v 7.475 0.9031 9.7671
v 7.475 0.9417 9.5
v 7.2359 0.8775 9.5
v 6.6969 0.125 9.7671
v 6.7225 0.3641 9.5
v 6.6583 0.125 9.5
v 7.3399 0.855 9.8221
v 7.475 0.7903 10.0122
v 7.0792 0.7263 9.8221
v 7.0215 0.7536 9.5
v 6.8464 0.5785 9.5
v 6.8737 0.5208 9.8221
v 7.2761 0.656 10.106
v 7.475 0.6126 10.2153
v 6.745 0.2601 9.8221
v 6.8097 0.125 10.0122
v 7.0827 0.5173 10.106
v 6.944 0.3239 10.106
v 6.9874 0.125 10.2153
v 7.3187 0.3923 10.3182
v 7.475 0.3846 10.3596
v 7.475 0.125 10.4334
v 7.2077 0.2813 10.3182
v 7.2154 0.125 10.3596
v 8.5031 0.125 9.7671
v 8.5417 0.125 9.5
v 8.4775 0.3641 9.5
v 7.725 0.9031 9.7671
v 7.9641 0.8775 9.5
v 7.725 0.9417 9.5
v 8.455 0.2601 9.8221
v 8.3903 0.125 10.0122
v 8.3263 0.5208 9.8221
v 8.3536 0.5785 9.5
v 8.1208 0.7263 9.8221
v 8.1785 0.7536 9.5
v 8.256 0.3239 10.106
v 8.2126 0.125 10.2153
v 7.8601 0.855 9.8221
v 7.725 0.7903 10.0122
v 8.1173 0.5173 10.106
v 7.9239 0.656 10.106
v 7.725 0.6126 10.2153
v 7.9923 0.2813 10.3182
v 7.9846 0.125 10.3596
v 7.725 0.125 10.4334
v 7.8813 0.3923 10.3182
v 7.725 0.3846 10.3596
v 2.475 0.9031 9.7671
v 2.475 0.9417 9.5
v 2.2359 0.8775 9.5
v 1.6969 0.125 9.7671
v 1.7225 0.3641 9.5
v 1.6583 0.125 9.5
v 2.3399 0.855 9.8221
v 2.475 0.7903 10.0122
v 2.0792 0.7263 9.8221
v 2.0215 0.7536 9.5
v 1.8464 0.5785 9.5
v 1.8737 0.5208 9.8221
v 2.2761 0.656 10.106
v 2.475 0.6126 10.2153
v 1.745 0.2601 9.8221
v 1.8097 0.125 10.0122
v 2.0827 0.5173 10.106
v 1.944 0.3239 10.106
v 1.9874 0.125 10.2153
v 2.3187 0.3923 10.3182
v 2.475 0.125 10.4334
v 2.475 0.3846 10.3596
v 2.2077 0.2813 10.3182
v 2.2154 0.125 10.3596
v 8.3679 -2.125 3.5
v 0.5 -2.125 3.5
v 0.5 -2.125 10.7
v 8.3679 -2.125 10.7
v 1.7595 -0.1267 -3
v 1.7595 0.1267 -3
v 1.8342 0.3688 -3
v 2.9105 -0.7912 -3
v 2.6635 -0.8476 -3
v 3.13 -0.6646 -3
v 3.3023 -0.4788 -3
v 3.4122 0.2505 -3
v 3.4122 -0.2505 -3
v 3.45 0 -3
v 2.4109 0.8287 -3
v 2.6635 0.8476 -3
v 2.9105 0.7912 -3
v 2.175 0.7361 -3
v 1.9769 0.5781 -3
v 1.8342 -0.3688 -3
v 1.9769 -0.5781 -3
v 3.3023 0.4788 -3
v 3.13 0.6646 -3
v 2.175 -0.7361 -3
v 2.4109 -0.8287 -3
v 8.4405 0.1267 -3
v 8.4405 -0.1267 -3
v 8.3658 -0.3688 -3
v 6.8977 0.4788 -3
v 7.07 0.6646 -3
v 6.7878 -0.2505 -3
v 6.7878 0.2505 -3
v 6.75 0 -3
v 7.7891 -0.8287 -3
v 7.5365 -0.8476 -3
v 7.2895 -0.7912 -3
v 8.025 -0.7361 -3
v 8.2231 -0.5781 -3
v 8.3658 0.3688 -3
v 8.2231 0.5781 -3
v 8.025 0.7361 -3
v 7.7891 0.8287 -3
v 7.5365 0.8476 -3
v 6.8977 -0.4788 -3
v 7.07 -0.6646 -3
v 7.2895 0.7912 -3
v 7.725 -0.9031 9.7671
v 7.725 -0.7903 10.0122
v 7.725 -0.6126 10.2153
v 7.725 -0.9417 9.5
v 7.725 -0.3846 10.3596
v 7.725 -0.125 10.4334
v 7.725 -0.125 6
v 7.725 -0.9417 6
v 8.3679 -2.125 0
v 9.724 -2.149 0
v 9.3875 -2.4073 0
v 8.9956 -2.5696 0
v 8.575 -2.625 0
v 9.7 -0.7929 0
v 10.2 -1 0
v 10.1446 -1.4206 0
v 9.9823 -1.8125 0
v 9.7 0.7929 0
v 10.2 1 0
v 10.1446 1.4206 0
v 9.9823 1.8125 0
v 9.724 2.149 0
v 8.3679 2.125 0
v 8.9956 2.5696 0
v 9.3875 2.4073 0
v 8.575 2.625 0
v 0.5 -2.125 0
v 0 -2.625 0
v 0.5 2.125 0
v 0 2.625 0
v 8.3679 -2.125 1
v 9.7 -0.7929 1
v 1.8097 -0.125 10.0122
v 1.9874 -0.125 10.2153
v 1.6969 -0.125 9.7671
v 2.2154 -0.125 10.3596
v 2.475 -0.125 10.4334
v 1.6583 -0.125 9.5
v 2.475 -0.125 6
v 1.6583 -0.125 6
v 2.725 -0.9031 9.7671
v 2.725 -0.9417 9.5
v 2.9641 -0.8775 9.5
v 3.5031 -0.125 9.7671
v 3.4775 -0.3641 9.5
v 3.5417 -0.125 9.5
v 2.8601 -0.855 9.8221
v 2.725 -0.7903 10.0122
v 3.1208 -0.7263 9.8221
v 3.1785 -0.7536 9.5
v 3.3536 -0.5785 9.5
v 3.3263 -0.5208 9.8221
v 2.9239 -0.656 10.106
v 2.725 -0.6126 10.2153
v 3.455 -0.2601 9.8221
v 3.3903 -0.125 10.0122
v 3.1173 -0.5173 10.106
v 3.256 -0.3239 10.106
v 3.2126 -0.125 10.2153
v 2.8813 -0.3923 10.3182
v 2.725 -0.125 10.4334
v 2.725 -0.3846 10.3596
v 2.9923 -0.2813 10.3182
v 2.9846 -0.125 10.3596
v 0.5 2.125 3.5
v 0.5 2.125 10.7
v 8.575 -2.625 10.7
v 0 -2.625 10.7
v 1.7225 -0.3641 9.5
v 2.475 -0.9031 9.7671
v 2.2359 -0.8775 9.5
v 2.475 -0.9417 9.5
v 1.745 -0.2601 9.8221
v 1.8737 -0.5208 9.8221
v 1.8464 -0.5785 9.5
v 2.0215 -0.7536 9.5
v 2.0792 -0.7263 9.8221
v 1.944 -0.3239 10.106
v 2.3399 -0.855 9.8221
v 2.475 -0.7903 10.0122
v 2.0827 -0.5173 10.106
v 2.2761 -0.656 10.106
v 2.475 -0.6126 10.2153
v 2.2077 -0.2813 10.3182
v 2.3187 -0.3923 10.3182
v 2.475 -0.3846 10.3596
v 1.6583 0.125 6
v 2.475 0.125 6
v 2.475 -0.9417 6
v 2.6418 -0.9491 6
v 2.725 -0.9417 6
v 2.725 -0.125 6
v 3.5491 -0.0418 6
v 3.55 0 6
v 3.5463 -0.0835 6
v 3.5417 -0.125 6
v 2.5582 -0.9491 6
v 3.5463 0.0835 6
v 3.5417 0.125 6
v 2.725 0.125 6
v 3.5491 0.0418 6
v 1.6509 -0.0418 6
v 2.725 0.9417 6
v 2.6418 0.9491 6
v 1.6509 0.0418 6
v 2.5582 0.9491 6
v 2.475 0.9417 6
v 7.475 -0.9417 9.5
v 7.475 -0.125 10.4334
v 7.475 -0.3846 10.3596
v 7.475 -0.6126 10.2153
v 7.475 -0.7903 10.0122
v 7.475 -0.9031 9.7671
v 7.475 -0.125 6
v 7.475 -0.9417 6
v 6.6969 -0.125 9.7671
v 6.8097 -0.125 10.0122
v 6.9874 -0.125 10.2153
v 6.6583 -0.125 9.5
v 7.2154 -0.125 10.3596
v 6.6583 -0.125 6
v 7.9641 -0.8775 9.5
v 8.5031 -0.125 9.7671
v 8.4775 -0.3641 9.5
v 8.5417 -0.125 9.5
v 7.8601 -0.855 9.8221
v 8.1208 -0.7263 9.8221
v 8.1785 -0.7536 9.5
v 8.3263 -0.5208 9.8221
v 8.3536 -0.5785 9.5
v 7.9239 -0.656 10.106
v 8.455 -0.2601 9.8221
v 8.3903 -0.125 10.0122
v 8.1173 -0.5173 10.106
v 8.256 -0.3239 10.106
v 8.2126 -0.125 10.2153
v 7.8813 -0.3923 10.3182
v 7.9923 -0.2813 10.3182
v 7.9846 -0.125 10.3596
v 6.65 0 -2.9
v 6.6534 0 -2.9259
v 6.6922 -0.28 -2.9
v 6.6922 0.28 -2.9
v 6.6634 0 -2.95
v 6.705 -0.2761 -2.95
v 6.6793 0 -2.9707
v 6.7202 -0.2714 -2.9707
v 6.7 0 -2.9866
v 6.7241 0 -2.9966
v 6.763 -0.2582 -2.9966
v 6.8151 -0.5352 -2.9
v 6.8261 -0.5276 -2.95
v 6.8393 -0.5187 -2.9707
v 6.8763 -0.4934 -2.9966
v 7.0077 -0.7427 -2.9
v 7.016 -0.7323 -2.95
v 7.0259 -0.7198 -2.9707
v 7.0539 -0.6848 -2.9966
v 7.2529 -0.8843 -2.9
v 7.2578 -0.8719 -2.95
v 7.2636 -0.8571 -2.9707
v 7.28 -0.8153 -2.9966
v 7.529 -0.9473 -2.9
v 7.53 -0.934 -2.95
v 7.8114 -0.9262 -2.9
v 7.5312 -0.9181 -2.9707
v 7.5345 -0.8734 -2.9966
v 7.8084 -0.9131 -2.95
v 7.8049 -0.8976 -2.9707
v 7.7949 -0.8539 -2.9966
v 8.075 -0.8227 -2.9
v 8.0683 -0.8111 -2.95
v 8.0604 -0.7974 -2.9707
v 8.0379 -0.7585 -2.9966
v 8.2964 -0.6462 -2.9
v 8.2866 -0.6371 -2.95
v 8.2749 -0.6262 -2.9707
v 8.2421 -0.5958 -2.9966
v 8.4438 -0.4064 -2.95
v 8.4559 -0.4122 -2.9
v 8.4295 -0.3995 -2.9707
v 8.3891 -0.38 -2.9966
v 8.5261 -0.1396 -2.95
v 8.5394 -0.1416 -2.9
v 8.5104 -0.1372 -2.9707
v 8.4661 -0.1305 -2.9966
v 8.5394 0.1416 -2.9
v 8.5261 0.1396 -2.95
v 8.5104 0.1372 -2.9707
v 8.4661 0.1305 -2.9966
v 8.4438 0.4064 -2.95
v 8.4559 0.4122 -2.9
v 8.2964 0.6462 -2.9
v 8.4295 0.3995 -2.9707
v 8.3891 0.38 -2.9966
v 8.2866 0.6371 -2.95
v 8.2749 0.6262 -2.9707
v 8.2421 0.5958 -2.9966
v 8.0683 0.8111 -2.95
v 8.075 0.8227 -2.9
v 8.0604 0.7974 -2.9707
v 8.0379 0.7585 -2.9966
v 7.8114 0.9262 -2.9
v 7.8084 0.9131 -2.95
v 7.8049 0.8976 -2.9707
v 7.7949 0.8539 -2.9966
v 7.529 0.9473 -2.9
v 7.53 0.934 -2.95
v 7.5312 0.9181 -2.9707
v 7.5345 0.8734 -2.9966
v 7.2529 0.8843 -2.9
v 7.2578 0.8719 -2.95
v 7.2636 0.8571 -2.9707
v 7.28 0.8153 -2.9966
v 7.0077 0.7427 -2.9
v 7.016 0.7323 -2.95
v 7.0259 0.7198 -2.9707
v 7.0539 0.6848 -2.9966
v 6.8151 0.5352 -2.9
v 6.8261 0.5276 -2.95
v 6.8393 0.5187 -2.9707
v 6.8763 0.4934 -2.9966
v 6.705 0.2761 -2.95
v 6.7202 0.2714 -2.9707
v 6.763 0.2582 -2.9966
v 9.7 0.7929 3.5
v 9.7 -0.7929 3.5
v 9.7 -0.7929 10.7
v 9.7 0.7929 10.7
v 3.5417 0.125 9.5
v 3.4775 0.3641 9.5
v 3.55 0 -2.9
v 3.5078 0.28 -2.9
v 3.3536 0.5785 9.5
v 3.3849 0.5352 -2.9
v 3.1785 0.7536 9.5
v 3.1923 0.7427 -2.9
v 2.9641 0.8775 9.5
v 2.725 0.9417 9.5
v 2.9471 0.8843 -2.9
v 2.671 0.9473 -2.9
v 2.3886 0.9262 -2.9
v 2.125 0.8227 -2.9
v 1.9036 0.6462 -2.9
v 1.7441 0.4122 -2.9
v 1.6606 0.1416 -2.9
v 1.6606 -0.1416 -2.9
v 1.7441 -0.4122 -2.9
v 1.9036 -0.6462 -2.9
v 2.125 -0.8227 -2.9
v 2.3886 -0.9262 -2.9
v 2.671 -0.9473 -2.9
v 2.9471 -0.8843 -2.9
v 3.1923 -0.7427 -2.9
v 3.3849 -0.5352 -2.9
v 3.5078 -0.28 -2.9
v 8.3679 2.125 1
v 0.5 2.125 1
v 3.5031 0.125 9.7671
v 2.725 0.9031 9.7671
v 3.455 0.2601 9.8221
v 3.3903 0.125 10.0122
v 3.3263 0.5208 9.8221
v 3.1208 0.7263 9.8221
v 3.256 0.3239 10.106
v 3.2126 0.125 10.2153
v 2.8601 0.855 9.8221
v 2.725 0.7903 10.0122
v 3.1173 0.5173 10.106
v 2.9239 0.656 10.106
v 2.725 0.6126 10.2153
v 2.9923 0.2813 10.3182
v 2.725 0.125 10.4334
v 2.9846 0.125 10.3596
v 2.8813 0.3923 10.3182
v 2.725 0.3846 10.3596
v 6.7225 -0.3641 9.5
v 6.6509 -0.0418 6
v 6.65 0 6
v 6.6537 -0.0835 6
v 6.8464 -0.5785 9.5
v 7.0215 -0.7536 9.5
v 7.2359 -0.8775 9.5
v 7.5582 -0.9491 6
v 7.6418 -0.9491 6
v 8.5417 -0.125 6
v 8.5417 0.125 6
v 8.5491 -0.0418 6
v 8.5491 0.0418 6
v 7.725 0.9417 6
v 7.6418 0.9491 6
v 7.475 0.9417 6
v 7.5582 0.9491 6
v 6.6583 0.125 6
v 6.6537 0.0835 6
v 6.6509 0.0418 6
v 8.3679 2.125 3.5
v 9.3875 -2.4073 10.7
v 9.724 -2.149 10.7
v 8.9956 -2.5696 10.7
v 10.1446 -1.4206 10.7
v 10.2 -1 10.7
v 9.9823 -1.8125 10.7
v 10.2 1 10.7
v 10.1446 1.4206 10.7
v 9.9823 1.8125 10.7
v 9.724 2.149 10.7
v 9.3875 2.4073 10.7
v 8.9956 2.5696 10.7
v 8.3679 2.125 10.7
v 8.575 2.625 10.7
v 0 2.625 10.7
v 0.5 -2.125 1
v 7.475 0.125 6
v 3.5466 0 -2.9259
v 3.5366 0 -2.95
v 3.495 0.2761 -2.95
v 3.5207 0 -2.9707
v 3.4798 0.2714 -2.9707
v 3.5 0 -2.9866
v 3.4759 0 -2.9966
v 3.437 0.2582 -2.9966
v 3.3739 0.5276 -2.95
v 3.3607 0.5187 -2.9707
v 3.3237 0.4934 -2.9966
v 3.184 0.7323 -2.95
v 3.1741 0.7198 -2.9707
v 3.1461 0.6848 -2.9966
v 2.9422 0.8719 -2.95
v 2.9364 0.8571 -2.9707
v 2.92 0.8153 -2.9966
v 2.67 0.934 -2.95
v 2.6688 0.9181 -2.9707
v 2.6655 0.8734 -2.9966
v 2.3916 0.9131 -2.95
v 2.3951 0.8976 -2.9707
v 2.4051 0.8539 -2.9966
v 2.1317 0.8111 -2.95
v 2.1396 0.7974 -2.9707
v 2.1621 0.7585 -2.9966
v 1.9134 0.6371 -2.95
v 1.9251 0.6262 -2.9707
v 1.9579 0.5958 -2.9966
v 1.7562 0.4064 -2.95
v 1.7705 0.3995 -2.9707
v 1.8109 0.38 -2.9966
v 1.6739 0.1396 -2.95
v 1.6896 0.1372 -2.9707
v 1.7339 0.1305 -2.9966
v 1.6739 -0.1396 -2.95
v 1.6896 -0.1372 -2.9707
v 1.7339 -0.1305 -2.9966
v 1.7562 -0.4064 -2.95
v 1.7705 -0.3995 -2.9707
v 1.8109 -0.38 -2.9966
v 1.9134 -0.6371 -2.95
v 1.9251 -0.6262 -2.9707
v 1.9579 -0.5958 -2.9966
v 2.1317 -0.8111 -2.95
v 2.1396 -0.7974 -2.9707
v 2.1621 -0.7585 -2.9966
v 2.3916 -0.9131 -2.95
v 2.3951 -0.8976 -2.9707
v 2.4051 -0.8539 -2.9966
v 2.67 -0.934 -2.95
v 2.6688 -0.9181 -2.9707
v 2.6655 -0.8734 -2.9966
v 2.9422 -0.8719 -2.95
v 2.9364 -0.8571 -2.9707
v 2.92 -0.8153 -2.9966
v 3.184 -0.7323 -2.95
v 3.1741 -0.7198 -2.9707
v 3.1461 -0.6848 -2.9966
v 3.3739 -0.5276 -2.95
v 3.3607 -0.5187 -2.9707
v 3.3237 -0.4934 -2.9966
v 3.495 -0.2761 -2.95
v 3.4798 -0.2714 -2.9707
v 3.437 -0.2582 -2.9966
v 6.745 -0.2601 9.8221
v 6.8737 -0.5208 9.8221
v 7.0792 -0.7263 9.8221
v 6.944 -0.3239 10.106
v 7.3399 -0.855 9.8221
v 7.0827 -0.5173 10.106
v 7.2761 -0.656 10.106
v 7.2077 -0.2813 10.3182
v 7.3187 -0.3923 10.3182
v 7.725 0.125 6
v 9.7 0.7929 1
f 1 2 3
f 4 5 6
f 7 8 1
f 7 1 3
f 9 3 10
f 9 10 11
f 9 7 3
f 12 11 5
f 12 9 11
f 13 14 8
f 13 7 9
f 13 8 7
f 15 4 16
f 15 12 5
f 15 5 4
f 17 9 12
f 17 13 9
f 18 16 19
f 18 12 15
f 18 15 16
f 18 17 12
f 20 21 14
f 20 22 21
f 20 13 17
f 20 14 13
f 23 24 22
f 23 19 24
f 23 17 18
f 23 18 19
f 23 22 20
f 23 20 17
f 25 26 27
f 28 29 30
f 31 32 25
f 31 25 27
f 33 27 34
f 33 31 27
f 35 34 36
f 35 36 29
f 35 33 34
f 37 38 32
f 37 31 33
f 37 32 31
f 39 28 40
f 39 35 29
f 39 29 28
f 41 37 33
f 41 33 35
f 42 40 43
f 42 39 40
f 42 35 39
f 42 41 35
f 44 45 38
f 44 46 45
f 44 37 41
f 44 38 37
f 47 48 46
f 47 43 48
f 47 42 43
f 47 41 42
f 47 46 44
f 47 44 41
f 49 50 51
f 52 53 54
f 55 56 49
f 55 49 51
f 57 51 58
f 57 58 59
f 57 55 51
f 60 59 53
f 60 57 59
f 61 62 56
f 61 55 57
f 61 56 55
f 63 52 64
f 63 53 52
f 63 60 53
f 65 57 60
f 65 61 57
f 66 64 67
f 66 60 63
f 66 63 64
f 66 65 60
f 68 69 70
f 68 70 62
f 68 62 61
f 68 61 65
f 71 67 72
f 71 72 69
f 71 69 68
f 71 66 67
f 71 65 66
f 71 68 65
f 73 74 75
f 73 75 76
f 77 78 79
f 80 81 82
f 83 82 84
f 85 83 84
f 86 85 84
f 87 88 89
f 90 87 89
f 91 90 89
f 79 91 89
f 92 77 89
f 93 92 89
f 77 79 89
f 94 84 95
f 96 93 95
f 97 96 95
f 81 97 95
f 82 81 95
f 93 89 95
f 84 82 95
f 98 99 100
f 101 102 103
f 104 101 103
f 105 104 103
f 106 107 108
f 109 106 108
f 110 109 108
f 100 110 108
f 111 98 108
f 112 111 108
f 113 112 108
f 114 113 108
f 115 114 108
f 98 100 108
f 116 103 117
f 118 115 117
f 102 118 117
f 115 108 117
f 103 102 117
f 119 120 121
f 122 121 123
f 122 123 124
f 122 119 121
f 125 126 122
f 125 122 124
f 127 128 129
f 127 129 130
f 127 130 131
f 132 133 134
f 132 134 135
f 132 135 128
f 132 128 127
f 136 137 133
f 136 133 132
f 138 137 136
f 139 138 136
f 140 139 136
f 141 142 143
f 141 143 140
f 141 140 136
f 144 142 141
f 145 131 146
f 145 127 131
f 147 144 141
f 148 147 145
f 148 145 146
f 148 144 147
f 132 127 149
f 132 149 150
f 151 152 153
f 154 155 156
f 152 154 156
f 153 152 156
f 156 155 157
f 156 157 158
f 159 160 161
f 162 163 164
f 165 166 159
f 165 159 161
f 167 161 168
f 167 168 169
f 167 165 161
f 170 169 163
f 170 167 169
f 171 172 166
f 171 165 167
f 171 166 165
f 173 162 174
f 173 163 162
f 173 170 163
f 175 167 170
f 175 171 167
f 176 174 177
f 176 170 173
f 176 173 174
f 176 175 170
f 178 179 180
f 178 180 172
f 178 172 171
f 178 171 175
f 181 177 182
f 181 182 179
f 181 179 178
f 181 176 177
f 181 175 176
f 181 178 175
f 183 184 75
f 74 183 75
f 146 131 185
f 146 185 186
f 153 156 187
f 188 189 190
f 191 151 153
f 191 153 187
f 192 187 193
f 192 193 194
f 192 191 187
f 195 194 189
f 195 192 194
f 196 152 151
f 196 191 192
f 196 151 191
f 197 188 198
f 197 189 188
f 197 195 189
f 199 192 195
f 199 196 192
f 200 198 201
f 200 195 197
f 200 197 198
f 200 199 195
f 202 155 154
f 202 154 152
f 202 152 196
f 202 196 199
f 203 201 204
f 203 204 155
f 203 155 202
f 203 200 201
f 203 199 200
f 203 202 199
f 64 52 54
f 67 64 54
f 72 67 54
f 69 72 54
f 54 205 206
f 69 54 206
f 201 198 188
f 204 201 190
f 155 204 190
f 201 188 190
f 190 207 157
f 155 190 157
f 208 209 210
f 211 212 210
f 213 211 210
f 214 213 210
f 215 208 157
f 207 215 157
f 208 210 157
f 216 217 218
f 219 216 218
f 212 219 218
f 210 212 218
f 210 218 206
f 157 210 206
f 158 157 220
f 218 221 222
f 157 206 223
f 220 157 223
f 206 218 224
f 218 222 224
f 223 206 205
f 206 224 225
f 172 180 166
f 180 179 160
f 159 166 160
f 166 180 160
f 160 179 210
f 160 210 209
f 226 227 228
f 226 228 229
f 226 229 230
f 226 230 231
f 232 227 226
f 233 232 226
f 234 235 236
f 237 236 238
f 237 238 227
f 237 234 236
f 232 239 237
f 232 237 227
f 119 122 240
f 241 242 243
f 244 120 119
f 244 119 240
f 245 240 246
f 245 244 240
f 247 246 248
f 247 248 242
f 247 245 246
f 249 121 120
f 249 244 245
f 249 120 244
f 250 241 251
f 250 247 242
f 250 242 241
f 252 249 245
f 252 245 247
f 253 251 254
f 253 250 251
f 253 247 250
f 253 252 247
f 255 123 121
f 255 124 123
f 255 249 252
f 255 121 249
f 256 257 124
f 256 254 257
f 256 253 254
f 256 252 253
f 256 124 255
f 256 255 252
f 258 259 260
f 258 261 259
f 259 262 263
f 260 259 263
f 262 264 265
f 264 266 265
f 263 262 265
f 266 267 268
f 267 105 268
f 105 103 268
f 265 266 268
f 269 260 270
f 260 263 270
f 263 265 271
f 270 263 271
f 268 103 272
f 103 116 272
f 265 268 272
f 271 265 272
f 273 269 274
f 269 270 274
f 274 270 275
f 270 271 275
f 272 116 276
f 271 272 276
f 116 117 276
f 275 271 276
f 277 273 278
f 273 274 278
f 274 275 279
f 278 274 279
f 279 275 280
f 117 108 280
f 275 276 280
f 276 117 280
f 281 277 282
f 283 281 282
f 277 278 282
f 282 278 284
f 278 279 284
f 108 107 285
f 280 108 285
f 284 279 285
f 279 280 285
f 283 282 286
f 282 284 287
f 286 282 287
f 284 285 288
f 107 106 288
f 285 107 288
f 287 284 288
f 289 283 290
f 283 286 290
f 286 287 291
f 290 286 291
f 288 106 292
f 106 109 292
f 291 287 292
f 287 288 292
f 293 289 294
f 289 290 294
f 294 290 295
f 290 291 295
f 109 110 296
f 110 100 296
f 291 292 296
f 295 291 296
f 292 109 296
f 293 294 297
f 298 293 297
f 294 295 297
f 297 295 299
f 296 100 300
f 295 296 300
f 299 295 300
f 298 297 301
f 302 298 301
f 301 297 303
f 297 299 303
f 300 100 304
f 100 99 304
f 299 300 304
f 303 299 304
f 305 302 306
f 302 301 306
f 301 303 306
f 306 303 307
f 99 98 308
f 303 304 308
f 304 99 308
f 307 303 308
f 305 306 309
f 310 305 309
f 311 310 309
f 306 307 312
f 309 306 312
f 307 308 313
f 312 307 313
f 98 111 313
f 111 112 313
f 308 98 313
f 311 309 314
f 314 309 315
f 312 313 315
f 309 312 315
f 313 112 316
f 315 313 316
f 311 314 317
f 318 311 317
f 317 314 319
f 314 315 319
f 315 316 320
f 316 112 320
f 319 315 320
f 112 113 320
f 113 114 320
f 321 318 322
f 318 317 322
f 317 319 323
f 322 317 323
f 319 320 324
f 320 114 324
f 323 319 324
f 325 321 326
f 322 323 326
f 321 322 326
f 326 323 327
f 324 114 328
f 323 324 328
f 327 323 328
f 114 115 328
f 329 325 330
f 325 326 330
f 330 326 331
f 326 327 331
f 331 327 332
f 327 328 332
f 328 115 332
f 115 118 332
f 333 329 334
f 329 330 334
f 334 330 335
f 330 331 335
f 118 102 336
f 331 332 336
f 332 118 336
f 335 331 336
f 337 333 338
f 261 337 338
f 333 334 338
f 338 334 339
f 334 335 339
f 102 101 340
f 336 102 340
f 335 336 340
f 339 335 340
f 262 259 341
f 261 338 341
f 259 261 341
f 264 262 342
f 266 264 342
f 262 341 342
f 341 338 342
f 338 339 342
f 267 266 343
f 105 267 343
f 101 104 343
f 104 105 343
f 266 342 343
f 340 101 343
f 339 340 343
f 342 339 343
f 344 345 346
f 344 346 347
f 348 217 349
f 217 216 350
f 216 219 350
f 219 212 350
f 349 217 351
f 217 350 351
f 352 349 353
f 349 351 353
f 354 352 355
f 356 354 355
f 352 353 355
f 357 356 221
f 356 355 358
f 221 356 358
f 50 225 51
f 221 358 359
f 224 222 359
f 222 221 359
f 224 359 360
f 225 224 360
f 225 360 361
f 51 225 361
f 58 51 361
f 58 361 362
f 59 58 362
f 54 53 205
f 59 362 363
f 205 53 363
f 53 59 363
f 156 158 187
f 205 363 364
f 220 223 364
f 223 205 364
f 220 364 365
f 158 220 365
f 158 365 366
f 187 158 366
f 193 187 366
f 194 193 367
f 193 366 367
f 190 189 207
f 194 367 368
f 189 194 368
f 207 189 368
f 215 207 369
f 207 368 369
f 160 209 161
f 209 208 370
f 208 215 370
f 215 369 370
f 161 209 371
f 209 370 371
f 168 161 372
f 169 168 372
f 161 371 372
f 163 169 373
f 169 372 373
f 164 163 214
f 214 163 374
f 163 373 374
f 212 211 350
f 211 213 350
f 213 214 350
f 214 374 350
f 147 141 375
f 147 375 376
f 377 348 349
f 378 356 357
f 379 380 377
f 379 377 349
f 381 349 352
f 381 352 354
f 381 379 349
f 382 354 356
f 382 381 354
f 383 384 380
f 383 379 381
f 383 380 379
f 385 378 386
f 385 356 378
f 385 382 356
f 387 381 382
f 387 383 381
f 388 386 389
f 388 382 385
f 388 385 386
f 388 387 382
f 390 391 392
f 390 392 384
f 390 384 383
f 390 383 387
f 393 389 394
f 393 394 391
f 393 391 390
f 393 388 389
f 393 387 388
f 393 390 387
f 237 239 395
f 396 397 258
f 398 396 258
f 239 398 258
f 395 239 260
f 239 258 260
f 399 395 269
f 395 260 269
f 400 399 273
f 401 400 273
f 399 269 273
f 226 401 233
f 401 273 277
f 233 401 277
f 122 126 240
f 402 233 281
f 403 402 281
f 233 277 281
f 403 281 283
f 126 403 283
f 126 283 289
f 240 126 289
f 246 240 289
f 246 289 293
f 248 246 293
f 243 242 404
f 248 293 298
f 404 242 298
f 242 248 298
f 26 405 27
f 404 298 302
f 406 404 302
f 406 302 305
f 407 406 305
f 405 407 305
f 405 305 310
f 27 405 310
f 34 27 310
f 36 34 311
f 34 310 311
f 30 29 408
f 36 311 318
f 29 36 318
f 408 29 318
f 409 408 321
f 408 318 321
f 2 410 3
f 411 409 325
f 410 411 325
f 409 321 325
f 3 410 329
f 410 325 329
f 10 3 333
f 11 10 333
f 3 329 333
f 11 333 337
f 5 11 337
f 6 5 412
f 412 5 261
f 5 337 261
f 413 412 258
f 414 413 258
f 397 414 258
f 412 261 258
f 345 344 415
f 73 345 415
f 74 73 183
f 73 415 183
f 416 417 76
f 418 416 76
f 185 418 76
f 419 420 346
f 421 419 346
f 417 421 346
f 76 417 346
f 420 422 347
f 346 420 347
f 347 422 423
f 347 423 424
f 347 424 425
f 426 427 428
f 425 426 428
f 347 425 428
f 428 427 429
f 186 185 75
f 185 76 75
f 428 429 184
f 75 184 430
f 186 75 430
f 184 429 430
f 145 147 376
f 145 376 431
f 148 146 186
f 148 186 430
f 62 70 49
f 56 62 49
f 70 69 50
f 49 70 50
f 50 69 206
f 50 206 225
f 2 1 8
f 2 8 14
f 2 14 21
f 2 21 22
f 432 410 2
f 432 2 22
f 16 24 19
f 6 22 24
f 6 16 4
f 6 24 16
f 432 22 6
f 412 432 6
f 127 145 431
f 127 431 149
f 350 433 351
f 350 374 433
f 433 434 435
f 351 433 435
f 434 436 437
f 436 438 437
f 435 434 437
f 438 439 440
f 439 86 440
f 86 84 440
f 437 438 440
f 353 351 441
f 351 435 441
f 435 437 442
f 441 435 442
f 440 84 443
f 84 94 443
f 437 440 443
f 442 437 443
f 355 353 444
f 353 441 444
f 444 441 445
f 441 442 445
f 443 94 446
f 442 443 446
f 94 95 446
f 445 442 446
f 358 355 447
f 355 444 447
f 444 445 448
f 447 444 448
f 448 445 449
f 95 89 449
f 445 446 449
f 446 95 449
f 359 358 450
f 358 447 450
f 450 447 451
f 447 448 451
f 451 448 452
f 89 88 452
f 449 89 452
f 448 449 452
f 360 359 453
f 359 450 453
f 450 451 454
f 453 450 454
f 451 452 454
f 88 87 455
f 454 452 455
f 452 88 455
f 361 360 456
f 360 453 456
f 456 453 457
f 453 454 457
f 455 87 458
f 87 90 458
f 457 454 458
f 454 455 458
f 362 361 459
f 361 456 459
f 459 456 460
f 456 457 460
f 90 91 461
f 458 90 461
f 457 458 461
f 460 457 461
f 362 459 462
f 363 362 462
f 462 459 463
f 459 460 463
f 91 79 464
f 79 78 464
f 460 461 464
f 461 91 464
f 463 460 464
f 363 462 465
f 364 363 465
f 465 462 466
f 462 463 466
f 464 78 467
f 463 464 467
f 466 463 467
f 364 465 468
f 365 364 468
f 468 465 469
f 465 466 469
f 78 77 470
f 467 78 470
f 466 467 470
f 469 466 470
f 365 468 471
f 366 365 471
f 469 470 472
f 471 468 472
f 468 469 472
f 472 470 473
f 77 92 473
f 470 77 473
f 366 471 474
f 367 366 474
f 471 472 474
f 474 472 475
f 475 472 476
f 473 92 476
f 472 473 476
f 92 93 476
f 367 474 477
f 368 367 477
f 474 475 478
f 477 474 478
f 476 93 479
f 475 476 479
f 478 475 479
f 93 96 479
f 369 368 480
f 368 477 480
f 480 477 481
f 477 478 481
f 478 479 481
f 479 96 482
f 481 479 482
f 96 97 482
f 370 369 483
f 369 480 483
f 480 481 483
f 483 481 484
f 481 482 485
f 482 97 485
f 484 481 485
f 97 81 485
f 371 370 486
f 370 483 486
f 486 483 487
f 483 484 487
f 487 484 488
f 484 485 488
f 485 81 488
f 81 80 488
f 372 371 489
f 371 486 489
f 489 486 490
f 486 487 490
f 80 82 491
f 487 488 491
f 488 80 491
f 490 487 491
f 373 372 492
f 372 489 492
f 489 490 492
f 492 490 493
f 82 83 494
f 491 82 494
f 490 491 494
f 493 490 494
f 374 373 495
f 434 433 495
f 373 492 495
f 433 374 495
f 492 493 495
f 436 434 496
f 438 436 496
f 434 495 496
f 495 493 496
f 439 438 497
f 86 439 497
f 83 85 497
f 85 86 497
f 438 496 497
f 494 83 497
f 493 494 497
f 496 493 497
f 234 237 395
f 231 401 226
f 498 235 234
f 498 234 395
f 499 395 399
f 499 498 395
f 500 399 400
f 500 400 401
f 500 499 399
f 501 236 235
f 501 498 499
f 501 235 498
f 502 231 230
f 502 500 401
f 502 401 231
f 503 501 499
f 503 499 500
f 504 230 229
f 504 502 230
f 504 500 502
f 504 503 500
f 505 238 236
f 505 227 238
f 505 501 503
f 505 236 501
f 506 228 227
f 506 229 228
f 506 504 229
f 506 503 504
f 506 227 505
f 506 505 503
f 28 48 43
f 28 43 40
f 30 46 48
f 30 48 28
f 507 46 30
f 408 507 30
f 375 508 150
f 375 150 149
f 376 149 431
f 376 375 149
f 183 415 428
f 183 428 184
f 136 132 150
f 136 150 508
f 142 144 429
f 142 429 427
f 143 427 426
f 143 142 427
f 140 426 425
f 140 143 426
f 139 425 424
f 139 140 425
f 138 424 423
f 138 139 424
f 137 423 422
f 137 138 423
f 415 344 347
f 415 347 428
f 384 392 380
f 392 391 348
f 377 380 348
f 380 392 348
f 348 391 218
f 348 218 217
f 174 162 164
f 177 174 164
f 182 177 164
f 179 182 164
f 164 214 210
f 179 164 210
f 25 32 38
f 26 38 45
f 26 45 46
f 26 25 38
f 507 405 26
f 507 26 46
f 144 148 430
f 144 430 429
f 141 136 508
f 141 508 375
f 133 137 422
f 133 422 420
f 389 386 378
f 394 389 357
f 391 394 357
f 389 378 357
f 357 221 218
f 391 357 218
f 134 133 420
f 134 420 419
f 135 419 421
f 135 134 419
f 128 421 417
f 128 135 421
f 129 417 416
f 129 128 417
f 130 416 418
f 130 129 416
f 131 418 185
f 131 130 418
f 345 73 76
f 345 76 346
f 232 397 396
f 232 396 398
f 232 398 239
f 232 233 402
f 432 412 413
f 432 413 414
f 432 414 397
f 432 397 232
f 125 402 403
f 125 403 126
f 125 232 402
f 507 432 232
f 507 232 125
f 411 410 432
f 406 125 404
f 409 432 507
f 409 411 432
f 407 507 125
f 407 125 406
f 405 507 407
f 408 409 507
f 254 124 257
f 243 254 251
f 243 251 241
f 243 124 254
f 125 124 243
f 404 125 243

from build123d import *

# Parameters (mm, degrees)
BOSS_EXTRUDE1_DEPTH        = 10.7
BOSS_EXTRUDE5_DEPTH        = 9.5
BOSS_EXTRUDE5_DEPTH_BACK   = 3
SKETCH1_4_R                = 0.95
BOSS_EXTRUDE5_2_DEPTH      = 9.5
BOSS_EXTRUDE5_2_DEPTH_BACK = 3
BOSS_EXTRUDE3_DEPTH        = 2.5
DOME1_FACE_RADIUS          = 0.95
DOME1_HEIGHT               = 0.95
DOME2_FACE_RADIUS          = 0.95
DOME2_HEIGHT               = 0.95
CUT_EXTRUDE1_DEPTH         = 14.85390288
FILLET2_R                  = 0.1
FILLET3_R                  = 0.1


with BuildPart() as part:
    # Sketch1 → Boss-Extrude1 (new body)
    with BuildSketch(Plane.XY):
        with BuildLine():
            Line((0, -2.625), (0, 2.625))
            Line((0, 2.625), (8.575, 2.625))
            ThreePointArc((8.575, 2.625), (9.724048519, 2.149048519), (10.2, 1))
            Line((10.2, 1), (10.2, -1))
            ThreePointArc((10.2, -1), (9.724048519, -2.149048519), (8.575, -2.625))
            Line((8.575, -2.625), (0, -2.625))
        make_face()
        Polygon((0.5, -2.125), (8.367893219, -2.125), (9.7, -0.792893219), (9.7, 0.792893219), (8.367893219, 2.125), (0.5, 2.125), align=None, mode=Mode.SUBTRACT)
    extrude(amount=BOSS_EXTRUDE1_DEPTH)

    # Sketch3 → Boss-Extrude3 (add)
    with BuildSketch(Plane(origin=(0, 0, 1), x_dir=(-1, 0, 0), z_dir=(0, 0, -1))):
        Polygon((-0.5, -2.125), (-0.5, 2.125), (-8.367893219, 2.125), (-9.7, 0.792893219), (-9.7, -0.792893219), (-8.367893219, -2.125), align=None)
    extrude(amount=-BOSS_EXTRUDE3_DEPTH)


with BuildPart() as body_2:
    # Sketch1<4> → Boss-Extrude5 (new, two sides: drawn at the far end of the back side and taken through both)
    with BuildSketch(Plane.XY.offset(-BOSS_EXTRUDE5_DEPTH_BACK)):
        with Locations((2.6, 0)):
            Circle(SKETCH1_4_R)
    extrude(amount=BOSS_EXTRUDE5_DEPTH + BOSS_EXTRUDE5_DEPTH_BACK)

    # Dome2: a dome of height H over a round flat face of radius A is a cap of a sphere of radius (A * A + H * H) / (2 * H)
    dome2_r = (DOME2_FACE_RADIUS * DOME2_FACE_RADIUS + DOME2_HEIGHT * DOME2_HEIGHT) / (2 * DOME2_HEIGHT)
    dome2_base = Plane((2.6, 0, 9.5), z_dir=(0, 0, 1))
    with Locations(dome2_base.offset(DOME2_HEIGHT - dome2_r)):
        dome2_ball = Sphere(dome2_r, mode=Mode.PRIVATE)
    add(split(dome2_ball, bisect_by=dome2_base, keep=Keep.TOP, mode=Mode.PRIVATE))


with BuildPart() as body_3:
    # Sketch1<4> → Boss-Extrude5 2 (new, two sides: drawn at the far end of the back side and taken through both)
    with BuildSketch(Plane.XY.offset(-BOSS_EXTRUDE5_2_DEPTH_BACK)):
        with Locations(Location((7.6, 0, 0), (0, 0, 180))):
            Circle(SKETCH1_4_R)
    extrude(amount=BOSS_EXTRUDE5_2_DEPTH + BOSS_EXTRUDE5_2_DEPTH_BACK)

    # Dome1: a dome of height H over a round flat face of radius A is a cap of a sphere of radius (A * A + H * H) / (2 * H)
    dome1_r = (DOME1_FACE_RADIUS * DOME1_FACE_RADIUS + DOME1_HEIGHT * DOME1_HEIGHT) / (2 * DOME1_HEIGHT)
    dome1_base = Plane((7.6, 0, 9.5), z_dir=(0, 0, 1))
    with Locations(dome1_base.offset(DOME1_HEIGHT - dome1_r)):
        dome1_ball = Sphere(dome1_r, mode=Mode.PRIVATE)
    add(split(dome1_ball, bisect_by=dome1_base, keep=Keep.TOP, mode=Mode.PRIVATE))


with BuildPart() as cut_extrude1_tool:
    # Sketch4 → Cut-Extrude1 (new, through all)
    with BuildSketch(Plane.XY.offset(6)):
        with BuildLine():
            Line((7.475, 0.94174041), (7.475, 0.125))
            Line((7.475, 0.125), (6.65825959, 0.125))
            ThreePointArc((6.65825959, 0.125), (6.65, 0), (6.65825959, -0.125))
            Line((6.65825959, -0.125), (7.475, -0.125))
            Line((7.475, -0.125), (7.475, -0.94174041))
            ThreePointArc((7.475, -0.94174041), (7.6, -0.95), (7.725, -0.94174041))
            Line((7.725, -0.94174041), (7.725, -0.125))
            Line((7.725, -0.125), (8.54174041, -0.125))
            ThreePointArc((8.54174041, -0.125), (8.55, 0), (8.54174041, 0.125))
            Line((8.54174041, 0.125), (7.725, 0.125))
            Line((7.725, 0.125), (7.725, 0.94174041))
            ThreePointArc((7.725, 0.94174041), (7.6, 0.95), (7.475, 0.94174041))
        make_face()
        with BuildLine():
            Line((3.54174041, -0.125), (2.725, -0.125))
            Line((2.725, -0.125), (2.725, -0.94174041))
            ThreePointArc((2.725, -0.94174041), (2.6, -0.95), (2.475, -0.94174041))
            Line((2.475, -0.94174041), (2.475, -0.125))
            Line((2.475, -0.125), (1.65825959, -0.125))
            ThreePointArc((1.65825959, -0.125), (1.65, 0), (1.65825959, 0.125))
            Line((1.65825959, 0.125), (2.475, 0.125))
            Line((2.475, 0.125), (2.475, 0.94174041))
            ThreePointArc((2.475, 0.94174041), (2.6, 0.95), (2.725, 0.94174041))
            Line((2.725, 0.94174041), (2.725, 0.125))
            Line((2.725, 0.125), (3.54174041, 0.125))
            ThreePointArc((3.54174041, 0.125), (3.55, 0), (3.54174041, -0.125))
        make_face()
    extrude(amount=CUT_EXTRUDE1_DEPTH)


with BuildPart() as body_2_1:
    add(body_2.part)

    # Cut-Extrude1: cut by cut_extrude1_tool
    add(cut_extrude1_tool.part, mode=Mode.SUBTRACT)

    # Fillet3
    fillet3_edges = [body_2_1.edges().sort_by_distance(p)[0] for p in [
        (1.65, 0, -3),
    ]]
    fillet(fillet3_edges, radius=FILLET3_R)


with BuildPart() as body_3_1:
    add(body_3.part)

    # Cut-Extrude1: cut by cut_extrude1_tool
    add(cut_extrude1_tool.part, mode=Mode.SUBTRACT)

    # Fillet2
    fillet2_edges = [body_3_1.edges().sort_by_distance(p)[0] for p in [
        (8.55, 0, -3),
    ]]
    fillet(fillet2_edges, radius=FILLET2_R)


solid = Compound([part.part, body_2_1.part, body_3_1.part])
